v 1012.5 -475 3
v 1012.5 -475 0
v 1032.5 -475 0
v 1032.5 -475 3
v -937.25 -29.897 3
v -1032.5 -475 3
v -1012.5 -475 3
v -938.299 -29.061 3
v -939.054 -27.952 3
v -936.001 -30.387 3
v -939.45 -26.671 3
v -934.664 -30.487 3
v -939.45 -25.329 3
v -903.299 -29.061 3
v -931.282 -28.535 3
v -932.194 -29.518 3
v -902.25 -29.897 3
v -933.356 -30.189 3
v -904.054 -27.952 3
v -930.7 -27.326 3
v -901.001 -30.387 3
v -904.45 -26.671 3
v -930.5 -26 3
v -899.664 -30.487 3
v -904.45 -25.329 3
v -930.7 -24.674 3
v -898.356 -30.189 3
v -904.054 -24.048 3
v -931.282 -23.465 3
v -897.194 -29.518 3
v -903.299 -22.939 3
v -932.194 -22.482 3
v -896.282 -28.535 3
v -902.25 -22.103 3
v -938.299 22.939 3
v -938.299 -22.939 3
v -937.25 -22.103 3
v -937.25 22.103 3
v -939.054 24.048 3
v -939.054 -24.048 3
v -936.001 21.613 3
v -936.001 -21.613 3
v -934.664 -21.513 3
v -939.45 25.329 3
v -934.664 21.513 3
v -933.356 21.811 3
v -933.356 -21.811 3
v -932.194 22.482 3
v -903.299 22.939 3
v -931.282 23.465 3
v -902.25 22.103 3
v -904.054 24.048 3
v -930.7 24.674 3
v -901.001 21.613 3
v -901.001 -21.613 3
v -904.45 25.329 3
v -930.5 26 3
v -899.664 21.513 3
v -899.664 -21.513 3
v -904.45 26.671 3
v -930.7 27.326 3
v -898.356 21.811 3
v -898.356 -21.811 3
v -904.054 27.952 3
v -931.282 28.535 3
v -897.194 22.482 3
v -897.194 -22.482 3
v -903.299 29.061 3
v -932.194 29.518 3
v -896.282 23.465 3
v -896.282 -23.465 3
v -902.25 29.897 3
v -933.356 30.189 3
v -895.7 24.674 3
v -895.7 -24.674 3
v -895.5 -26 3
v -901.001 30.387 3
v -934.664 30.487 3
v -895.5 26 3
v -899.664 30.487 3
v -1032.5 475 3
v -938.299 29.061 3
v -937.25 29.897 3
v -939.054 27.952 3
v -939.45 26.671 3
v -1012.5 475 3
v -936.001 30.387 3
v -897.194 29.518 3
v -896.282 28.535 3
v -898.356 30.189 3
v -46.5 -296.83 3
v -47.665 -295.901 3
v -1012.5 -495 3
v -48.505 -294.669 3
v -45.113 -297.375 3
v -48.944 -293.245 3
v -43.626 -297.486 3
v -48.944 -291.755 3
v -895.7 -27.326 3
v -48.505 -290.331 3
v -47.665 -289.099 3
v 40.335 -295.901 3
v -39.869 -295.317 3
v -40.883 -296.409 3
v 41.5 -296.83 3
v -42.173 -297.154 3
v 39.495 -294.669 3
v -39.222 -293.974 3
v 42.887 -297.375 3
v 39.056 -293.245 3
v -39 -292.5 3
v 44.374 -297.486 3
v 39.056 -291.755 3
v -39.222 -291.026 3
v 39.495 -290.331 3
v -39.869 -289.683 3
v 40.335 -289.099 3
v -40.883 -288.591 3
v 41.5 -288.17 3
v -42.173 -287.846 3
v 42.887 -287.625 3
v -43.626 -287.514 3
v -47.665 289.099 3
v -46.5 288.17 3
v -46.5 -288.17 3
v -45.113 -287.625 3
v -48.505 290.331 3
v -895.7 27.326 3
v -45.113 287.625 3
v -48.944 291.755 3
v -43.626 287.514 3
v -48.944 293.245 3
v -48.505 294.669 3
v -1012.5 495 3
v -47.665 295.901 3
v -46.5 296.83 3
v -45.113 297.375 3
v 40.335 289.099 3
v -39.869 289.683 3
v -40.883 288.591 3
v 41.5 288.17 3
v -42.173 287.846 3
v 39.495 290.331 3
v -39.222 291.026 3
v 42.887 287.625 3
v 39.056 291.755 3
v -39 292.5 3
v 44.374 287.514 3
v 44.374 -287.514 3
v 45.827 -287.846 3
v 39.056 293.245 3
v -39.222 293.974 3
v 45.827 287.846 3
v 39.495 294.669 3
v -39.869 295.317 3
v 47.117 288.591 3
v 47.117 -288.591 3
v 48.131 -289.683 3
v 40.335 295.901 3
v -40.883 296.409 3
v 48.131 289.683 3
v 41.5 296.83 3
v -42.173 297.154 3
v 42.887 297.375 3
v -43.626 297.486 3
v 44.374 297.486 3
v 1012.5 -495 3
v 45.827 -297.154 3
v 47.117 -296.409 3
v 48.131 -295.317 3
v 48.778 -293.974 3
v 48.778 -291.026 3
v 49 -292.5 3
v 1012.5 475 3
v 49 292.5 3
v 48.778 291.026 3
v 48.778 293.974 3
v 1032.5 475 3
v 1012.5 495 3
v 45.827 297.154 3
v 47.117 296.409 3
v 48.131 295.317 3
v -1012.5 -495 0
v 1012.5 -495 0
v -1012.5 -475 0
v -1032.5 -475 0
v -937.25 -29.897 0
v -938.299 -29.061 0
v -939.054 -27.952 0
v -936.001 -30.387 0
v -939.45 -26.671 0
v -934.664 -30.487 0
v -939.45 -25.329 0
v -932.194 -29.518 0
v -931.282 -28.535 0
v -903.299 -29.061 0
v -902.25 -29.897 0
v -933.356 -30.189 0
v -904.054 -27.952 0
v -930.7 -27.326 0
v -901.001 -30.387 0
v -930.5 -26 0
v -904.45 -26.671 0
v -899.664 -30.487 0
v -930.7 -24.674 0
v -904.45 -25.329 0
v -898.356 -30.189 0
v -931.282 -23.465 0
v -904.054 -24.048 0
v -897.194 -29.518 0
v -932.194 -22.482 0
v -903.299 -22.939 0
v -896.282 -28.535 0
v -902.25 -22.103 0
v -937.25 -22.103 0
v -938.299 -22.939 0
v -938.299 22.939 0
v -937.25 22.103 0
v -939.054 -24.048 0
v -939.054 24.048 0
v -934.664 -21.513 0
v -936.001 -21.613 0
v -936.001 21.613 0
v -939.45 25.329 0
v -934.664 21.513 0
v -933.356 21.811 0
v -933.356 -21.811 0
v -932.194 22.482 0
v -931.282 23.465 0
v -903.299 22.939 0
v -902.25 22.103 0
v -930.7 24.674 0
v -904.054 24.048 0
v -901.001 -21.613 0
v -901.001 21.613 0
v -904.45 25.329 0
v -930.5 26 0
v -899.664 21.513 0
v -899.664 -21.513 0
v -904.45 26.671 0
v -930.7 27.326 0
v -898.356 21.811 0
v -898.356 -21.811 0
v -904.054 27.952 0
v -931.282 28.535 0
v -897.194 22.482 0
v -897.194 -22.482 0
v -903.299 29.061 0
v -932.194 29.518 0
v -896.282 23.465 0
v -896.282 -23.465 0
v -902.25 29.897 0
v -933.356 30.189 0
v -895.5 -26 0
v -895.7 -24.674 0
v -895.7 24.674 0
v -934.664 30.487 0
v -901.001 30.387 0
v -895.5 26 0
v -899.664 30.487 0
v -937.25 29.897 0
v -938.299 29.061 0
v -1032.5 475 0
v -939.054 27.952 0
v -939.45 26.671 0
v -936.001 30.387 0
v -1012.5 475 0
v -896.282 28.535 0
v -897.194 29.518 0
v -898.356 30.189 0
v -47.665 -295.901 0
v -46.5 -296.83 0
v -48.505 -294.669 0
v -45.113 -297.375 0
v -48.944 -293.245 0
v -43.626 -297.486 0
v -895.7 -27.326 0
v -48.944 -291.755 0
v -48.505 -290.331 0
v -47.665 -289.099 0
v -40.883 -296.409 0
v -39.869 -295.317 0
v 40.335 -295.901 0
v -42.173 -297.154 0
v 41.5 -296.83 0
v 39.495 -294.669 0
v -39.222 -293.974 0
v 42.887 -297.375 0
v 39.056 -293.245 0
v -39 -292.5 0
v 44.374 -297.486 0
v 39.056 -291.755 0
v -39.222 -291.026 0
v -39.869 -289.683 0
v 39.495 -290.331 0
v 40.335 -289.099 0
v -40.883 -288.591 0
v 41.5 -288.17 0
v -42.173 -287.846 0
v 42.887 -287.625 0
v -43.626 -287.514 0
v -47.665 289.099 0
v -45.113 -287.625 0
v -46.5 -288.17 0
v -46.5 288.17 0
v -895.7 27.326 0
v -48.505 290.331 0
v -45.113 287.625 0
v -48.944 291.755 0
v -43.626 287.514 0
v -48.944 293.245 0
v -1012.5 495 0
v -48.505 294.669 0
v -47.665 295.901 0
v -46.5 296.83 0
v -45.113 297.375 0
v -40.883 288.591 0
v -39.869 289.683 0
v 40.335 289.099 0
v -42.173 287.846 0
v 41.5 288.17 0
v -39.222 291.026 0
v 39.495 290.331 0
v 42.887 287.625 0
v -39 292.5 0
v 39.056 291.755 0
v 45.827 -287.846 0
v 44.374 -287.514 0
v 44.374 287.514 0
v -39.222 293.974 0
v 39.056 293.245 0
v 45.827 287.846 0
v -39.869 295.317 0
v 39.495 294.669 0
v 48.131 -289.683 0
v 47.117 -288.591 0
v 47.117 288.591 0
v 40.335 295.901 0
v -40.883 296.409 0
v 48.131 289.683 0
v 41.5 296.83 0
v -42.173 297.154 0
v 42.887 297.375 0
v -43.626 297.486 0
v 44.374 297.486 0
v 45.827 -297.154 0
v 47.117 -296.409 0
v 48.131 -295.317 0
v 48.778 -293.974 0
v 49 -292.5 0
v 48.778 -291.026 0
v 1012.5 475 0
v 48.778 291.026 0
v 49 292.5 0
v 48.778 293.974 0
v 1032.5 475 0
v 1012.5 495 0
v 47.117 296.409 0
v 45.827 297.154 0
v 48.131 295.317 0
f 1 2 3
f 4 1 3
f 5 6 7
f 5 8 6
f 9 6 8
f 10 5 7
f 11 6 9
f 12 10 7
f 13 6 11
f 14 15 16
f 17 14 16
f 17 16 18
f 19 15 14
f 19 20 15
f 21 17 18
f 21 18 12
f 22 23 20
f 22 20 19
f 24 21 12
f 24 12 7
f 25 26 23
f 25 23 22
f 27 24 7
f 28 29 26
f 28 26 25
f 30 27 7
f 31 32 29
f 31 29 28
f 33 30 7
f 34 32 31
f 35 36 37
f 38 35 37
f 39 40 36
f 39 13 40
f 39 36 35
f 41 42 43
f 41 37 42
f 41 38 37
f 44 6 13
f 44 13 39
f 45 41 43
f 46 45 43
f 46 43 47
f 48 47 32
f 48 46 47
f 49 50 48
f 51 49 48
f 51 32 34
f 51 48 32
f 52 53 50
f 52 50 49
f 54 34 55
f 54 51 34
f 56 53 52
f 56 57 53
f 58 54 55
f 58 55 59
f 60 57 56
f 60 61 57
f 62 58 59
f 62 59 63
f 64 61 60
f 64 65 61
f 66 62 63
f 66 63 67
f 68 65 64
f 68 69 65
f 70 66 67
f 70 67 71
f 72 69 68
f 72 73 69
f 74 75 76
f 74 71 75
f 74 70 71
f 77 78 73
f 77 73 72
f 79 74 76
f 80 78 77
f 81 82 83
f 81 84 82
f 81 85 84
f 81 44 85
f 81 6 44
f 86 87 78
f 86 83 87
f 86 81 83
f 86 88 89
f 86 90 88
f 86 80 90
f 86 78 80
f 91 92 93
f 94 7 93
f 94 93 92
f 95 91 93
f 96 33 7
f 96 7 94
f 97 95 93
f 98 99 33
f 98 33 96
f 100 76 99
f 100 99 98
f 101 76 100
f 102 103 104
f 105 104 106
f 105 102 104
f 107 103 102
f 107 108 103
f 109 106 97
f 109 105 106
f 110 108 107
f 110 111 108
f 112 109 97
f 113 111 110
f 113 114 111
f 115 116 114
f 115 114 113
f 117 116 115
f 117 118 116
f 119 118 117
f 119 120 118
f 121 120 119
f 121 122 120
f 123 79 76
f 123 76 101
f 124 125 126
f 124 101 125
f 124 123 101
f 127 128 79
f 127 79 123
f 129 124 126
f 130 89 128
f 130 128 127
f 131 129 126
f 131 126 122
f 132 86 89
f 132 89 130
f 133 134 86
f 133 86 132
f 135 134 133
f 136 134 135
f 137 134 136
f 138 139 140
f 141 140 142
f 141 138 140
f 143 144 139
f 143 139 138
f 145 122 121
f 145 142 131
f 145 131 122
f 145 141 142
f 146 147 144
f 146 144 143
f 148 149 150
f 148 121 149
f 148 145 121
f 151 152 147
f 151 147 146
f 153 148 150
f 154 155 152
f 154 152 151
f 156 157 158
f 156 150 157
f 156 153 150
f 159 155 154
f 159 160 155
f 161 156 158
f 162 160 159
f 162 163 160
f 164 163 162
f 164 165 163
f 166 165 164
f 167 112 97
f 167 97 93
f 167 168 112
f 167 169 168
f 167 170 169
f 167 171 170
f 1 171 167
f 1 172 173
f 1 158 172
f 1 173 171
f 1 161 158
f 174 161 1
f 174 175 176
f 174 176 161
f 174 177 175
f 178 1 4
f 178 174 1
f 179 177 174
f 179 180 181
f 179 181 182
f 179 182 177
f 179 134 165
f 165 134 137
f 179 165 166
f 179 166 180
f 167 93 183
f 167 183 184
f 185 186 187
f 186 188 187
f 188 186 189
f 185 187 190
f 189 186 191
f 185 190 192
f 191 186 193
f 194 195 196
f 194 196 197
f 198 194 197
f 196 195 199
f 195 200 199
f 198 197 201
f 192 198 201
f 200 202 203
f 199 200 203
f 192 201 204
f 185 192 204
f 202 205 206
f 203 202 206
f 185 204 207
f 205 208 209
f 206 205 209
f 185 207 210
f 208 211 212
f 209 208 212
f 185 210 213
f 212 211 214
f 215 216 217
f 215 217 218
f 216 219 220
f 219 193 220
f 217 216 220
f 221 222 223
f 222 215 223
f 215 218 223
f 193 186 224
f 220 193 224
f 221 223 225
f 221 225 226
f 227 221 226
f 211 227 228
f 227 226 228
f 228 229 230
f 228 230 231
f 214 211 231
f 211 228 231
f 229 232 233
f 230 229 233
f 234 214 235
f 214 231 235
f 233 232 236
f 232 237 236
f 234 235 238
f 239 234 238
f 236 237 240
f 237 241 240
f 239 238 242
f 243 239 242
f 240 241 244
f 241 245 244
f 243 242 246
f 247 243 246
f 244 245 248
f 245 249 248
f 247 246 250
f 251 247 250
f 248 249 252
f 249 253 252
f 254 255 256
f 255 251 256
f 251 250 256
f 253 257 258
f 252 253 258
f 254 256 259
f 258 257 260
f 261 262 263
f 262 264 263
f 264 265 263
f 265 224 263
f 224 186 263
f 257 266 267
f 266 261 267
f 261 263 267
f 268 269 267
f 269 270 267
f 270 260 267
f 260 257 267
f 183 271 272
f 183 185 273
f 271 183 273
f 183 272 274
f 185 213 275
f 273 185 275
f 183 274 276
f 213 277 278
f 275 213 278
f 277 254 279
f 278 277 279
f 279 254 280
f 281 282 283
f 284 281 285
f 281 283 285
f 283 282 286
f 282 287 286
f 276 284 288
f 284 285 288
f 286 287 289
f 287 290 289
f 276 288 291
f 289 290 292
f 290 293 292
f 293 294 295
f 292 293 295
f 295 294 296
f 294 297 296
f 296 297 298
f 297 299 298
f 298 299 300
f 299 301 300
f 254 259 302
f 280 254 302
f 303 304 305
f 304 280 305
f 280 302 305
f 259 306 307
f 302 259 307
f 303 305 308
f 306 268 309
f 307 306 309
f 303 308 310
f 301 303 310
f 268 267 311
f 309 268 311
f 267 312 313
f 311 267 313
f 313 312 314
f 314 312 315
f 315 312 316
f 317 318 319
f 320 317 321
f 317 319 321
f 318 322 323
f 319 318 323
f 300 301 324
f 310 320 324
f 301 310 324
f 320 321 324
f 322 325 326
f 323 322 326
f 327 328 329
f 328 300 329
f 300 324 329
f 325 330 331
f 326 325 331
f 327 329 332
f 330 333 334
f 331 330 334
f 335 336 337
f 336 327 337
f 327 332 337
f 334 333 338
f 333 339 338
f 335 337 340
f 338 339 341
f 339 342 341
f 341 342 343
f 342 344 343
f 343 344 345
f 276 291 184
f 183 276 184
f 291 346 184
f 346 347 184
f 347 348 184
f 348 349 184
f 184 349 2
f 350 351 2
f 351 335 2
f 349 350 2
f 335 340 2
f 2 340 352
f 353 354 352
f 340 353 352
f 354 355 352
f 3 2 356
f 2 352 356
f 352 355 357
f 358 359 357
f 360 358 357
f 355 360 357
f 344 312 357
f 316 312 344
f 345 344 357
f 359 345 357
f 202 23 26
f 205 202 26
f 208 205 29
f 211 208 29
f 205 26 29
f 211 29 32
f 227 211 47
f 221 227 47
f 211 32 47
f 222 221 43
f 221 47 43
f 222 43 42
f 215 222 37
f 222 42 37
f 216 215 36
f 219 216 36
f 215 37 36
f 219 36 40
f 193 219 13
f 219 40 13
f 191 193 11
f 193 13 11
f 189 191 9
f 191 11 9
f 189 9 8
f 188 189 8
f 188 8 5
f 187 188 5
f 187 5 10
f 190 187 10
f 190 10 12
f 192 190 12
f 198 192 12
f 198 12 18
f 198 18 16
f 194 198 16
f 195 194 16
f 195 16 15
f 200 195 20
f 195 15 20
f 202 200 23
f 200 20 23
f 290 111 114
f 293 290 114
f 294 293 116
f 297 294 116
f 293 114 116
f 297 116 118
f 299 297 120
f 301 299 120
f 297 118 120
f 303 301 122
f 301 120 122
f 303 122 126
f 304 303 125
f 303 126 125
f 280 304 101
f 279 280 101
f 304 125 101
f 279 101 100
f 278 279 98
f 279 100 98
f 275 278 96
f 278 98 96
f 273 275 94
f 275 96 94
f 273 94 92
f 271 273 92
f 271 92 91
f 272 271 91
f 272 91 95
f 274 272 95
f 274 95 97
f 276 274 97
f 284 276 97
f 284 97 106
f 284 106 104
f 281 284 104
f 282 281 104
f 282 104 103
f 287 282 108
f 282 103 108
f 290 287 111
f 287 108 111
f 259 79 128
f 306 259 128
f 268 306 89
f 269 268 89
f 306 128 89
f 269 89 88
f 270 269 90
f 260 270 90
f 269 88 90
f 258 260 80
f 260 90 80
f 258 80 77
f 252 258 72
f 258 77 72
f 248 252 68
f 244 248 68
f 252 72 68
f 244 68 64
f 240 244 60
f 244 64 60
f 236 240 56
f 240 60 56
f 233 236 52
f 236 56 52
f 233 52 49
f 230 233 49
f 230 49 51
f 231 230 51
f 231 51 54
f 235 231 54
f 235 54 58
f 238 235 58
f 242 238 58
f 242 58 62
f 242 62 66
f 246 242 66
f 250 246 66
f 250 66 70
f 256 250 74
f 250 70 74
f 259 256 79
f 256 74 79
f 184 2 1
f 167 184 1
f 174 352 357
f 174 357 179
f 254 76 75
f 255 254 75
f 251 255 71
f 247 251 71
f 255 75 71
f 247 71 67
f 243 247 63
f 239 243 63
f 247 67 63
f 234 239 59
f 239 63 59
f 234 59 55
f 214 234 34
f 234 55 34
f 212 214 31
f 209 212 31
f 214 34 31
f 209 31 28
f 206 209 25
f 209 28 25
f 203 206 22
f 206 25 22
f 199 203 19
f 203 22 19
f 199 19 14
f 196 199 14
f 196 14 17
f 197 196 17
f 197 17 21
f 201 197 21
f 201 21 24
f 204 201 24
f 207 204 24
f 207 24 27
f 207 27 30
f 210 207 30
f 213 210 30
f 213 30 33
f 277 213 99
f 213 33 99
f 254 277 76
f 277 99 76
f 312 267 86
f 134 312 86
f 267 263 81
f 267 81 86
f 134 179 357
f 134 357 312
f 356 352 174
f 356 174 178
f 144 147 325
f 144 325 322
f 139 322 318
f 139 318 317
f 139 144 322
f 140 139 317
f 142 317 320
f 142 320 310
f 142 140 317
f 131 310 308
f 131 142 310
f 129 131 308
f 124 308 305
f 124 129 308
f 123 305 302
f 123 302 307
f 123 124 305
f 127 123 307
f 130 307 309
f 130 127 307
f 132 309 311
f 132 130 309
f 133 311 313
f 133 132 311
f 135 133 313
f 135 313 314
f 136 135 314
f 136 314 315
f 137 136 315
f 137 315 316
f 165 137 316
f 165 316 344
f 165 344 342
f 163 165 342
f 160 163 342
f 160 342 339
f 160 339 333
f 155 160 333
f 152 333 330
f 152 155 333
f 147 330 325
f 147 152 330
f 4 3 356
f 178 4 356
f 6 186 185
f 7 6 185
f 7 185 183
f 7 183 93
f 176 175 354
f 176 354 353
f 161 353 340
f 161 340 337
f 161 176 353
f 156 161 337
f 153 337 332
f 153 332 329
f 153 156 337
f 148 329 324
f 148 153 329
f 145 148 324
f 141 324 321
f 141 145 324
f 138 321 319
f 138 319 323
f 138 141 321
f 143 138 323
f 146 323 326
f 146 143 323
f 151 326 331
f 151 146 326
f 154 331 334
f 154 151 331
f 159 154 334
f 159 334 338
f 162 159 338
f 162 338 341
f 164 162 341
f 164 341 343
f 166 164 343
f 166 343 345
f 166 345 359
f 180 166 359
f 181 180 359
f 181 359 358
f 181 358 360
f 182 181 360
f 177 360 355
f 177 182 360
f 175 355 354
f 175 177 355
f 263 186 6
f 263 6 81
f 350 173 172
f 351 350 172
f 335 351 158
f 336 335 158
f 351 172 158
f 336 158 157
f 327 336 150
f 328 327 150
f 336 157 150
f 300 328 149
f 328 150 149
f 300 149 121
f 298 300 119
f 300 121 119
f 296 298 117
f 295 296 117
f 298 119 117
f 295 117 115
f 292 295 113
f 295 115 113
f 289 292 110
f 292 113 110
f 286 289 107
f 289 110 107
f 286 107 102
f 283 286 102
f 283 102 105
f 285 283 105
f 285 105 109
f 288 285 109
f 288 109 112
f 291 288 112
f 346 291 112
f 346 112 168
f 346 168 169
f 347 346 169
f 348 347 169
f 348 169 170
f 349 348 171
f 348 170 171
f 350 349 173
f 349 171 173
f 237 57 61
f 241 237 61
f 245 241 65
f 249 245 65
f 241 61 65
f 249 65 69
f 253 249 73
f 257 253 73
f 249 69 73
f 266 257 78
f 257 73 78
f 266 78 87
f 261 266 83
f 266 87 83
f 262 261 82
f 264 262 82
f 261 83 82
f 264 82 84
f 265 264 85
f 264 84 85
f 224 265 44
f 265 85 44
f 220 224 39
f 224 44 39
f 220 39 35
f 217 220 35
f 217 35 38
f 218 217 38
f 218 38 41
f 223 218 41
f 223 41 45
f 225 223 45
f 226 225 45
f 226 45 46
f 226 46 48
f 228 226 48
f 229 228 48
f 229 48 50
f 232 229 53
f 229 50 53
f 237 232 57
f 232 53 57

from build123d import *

# Parameters (mm, degrees)
F0_W      = 2065
F0_H      = 950
F1_DEPTH  = 3
F2_R      = 5
F3_DEPTH  = 3
F5_R      = 4.5
F6_DEPTH  = 3
F7_W      = 2025
F7_H      = 3
F8_DEPTH  = 20
F9_W      = 2025
F9_H      = 3
F10_DEPTH = 20


with BuildPart() as f1:
    # F0 (on Top) → F1 (new body)
    with BuildSketch(Plane.XY):
        Rectangle(F0_W, F0_H)
    extrude(amount=F1_DEPTH)

    # F2 (on face) → F3 (cut, through all)
    with BuildSketch(Plane.XY.offset(3)):
        with Locations((-44, -292.5)):
            Circle(F2_R)
        with Locations((44, -292.5)):
            Circle(F2_R)
    f3 = extrude(amount=-F3_DEPTH, mode=Mode.SUBTRACT)

    # F4: F3 across plane
    add(f3.mirror(Plane.XZ), mode=Mode.SUBTRACT)

    # F5 (on face) → F6 (cut, through all)
    with BuildSketch(Plane.XY.offset(3)):
        with Locations((-935, -26)):
            Circle(F5_R)
        with Locations((-935, 26)):
            Circle(F5_R)
        with Locations((-900, -26)):
            Circle(F5_R)
        with Locations((-900, 26)):
            Circle(F5_R)
    extrude(amount=-F6_DEPTH, mode=Mode.SUBTRACT)

    # F7 (on face) → F8 (join)
    with BuildSketch(Plane.XZ.offset(475)):
        with Locations((0, 1.5)):
            Rectangle(F7_W, F7_H)
    extrude(amount=F8_DEPTH)

    # F9 (on face) → F10 (join)
    with BuildSketch(Plane(origin=(0, 475, 0), x_dir=(-1, 0, 0), z_dir=(0, 1, 0))):
        with Locations((0, 1.5)):
            Rectangle(F9_W, F9_H)
    extrude(amount=F10_DEPTH)


solid = f1.part
